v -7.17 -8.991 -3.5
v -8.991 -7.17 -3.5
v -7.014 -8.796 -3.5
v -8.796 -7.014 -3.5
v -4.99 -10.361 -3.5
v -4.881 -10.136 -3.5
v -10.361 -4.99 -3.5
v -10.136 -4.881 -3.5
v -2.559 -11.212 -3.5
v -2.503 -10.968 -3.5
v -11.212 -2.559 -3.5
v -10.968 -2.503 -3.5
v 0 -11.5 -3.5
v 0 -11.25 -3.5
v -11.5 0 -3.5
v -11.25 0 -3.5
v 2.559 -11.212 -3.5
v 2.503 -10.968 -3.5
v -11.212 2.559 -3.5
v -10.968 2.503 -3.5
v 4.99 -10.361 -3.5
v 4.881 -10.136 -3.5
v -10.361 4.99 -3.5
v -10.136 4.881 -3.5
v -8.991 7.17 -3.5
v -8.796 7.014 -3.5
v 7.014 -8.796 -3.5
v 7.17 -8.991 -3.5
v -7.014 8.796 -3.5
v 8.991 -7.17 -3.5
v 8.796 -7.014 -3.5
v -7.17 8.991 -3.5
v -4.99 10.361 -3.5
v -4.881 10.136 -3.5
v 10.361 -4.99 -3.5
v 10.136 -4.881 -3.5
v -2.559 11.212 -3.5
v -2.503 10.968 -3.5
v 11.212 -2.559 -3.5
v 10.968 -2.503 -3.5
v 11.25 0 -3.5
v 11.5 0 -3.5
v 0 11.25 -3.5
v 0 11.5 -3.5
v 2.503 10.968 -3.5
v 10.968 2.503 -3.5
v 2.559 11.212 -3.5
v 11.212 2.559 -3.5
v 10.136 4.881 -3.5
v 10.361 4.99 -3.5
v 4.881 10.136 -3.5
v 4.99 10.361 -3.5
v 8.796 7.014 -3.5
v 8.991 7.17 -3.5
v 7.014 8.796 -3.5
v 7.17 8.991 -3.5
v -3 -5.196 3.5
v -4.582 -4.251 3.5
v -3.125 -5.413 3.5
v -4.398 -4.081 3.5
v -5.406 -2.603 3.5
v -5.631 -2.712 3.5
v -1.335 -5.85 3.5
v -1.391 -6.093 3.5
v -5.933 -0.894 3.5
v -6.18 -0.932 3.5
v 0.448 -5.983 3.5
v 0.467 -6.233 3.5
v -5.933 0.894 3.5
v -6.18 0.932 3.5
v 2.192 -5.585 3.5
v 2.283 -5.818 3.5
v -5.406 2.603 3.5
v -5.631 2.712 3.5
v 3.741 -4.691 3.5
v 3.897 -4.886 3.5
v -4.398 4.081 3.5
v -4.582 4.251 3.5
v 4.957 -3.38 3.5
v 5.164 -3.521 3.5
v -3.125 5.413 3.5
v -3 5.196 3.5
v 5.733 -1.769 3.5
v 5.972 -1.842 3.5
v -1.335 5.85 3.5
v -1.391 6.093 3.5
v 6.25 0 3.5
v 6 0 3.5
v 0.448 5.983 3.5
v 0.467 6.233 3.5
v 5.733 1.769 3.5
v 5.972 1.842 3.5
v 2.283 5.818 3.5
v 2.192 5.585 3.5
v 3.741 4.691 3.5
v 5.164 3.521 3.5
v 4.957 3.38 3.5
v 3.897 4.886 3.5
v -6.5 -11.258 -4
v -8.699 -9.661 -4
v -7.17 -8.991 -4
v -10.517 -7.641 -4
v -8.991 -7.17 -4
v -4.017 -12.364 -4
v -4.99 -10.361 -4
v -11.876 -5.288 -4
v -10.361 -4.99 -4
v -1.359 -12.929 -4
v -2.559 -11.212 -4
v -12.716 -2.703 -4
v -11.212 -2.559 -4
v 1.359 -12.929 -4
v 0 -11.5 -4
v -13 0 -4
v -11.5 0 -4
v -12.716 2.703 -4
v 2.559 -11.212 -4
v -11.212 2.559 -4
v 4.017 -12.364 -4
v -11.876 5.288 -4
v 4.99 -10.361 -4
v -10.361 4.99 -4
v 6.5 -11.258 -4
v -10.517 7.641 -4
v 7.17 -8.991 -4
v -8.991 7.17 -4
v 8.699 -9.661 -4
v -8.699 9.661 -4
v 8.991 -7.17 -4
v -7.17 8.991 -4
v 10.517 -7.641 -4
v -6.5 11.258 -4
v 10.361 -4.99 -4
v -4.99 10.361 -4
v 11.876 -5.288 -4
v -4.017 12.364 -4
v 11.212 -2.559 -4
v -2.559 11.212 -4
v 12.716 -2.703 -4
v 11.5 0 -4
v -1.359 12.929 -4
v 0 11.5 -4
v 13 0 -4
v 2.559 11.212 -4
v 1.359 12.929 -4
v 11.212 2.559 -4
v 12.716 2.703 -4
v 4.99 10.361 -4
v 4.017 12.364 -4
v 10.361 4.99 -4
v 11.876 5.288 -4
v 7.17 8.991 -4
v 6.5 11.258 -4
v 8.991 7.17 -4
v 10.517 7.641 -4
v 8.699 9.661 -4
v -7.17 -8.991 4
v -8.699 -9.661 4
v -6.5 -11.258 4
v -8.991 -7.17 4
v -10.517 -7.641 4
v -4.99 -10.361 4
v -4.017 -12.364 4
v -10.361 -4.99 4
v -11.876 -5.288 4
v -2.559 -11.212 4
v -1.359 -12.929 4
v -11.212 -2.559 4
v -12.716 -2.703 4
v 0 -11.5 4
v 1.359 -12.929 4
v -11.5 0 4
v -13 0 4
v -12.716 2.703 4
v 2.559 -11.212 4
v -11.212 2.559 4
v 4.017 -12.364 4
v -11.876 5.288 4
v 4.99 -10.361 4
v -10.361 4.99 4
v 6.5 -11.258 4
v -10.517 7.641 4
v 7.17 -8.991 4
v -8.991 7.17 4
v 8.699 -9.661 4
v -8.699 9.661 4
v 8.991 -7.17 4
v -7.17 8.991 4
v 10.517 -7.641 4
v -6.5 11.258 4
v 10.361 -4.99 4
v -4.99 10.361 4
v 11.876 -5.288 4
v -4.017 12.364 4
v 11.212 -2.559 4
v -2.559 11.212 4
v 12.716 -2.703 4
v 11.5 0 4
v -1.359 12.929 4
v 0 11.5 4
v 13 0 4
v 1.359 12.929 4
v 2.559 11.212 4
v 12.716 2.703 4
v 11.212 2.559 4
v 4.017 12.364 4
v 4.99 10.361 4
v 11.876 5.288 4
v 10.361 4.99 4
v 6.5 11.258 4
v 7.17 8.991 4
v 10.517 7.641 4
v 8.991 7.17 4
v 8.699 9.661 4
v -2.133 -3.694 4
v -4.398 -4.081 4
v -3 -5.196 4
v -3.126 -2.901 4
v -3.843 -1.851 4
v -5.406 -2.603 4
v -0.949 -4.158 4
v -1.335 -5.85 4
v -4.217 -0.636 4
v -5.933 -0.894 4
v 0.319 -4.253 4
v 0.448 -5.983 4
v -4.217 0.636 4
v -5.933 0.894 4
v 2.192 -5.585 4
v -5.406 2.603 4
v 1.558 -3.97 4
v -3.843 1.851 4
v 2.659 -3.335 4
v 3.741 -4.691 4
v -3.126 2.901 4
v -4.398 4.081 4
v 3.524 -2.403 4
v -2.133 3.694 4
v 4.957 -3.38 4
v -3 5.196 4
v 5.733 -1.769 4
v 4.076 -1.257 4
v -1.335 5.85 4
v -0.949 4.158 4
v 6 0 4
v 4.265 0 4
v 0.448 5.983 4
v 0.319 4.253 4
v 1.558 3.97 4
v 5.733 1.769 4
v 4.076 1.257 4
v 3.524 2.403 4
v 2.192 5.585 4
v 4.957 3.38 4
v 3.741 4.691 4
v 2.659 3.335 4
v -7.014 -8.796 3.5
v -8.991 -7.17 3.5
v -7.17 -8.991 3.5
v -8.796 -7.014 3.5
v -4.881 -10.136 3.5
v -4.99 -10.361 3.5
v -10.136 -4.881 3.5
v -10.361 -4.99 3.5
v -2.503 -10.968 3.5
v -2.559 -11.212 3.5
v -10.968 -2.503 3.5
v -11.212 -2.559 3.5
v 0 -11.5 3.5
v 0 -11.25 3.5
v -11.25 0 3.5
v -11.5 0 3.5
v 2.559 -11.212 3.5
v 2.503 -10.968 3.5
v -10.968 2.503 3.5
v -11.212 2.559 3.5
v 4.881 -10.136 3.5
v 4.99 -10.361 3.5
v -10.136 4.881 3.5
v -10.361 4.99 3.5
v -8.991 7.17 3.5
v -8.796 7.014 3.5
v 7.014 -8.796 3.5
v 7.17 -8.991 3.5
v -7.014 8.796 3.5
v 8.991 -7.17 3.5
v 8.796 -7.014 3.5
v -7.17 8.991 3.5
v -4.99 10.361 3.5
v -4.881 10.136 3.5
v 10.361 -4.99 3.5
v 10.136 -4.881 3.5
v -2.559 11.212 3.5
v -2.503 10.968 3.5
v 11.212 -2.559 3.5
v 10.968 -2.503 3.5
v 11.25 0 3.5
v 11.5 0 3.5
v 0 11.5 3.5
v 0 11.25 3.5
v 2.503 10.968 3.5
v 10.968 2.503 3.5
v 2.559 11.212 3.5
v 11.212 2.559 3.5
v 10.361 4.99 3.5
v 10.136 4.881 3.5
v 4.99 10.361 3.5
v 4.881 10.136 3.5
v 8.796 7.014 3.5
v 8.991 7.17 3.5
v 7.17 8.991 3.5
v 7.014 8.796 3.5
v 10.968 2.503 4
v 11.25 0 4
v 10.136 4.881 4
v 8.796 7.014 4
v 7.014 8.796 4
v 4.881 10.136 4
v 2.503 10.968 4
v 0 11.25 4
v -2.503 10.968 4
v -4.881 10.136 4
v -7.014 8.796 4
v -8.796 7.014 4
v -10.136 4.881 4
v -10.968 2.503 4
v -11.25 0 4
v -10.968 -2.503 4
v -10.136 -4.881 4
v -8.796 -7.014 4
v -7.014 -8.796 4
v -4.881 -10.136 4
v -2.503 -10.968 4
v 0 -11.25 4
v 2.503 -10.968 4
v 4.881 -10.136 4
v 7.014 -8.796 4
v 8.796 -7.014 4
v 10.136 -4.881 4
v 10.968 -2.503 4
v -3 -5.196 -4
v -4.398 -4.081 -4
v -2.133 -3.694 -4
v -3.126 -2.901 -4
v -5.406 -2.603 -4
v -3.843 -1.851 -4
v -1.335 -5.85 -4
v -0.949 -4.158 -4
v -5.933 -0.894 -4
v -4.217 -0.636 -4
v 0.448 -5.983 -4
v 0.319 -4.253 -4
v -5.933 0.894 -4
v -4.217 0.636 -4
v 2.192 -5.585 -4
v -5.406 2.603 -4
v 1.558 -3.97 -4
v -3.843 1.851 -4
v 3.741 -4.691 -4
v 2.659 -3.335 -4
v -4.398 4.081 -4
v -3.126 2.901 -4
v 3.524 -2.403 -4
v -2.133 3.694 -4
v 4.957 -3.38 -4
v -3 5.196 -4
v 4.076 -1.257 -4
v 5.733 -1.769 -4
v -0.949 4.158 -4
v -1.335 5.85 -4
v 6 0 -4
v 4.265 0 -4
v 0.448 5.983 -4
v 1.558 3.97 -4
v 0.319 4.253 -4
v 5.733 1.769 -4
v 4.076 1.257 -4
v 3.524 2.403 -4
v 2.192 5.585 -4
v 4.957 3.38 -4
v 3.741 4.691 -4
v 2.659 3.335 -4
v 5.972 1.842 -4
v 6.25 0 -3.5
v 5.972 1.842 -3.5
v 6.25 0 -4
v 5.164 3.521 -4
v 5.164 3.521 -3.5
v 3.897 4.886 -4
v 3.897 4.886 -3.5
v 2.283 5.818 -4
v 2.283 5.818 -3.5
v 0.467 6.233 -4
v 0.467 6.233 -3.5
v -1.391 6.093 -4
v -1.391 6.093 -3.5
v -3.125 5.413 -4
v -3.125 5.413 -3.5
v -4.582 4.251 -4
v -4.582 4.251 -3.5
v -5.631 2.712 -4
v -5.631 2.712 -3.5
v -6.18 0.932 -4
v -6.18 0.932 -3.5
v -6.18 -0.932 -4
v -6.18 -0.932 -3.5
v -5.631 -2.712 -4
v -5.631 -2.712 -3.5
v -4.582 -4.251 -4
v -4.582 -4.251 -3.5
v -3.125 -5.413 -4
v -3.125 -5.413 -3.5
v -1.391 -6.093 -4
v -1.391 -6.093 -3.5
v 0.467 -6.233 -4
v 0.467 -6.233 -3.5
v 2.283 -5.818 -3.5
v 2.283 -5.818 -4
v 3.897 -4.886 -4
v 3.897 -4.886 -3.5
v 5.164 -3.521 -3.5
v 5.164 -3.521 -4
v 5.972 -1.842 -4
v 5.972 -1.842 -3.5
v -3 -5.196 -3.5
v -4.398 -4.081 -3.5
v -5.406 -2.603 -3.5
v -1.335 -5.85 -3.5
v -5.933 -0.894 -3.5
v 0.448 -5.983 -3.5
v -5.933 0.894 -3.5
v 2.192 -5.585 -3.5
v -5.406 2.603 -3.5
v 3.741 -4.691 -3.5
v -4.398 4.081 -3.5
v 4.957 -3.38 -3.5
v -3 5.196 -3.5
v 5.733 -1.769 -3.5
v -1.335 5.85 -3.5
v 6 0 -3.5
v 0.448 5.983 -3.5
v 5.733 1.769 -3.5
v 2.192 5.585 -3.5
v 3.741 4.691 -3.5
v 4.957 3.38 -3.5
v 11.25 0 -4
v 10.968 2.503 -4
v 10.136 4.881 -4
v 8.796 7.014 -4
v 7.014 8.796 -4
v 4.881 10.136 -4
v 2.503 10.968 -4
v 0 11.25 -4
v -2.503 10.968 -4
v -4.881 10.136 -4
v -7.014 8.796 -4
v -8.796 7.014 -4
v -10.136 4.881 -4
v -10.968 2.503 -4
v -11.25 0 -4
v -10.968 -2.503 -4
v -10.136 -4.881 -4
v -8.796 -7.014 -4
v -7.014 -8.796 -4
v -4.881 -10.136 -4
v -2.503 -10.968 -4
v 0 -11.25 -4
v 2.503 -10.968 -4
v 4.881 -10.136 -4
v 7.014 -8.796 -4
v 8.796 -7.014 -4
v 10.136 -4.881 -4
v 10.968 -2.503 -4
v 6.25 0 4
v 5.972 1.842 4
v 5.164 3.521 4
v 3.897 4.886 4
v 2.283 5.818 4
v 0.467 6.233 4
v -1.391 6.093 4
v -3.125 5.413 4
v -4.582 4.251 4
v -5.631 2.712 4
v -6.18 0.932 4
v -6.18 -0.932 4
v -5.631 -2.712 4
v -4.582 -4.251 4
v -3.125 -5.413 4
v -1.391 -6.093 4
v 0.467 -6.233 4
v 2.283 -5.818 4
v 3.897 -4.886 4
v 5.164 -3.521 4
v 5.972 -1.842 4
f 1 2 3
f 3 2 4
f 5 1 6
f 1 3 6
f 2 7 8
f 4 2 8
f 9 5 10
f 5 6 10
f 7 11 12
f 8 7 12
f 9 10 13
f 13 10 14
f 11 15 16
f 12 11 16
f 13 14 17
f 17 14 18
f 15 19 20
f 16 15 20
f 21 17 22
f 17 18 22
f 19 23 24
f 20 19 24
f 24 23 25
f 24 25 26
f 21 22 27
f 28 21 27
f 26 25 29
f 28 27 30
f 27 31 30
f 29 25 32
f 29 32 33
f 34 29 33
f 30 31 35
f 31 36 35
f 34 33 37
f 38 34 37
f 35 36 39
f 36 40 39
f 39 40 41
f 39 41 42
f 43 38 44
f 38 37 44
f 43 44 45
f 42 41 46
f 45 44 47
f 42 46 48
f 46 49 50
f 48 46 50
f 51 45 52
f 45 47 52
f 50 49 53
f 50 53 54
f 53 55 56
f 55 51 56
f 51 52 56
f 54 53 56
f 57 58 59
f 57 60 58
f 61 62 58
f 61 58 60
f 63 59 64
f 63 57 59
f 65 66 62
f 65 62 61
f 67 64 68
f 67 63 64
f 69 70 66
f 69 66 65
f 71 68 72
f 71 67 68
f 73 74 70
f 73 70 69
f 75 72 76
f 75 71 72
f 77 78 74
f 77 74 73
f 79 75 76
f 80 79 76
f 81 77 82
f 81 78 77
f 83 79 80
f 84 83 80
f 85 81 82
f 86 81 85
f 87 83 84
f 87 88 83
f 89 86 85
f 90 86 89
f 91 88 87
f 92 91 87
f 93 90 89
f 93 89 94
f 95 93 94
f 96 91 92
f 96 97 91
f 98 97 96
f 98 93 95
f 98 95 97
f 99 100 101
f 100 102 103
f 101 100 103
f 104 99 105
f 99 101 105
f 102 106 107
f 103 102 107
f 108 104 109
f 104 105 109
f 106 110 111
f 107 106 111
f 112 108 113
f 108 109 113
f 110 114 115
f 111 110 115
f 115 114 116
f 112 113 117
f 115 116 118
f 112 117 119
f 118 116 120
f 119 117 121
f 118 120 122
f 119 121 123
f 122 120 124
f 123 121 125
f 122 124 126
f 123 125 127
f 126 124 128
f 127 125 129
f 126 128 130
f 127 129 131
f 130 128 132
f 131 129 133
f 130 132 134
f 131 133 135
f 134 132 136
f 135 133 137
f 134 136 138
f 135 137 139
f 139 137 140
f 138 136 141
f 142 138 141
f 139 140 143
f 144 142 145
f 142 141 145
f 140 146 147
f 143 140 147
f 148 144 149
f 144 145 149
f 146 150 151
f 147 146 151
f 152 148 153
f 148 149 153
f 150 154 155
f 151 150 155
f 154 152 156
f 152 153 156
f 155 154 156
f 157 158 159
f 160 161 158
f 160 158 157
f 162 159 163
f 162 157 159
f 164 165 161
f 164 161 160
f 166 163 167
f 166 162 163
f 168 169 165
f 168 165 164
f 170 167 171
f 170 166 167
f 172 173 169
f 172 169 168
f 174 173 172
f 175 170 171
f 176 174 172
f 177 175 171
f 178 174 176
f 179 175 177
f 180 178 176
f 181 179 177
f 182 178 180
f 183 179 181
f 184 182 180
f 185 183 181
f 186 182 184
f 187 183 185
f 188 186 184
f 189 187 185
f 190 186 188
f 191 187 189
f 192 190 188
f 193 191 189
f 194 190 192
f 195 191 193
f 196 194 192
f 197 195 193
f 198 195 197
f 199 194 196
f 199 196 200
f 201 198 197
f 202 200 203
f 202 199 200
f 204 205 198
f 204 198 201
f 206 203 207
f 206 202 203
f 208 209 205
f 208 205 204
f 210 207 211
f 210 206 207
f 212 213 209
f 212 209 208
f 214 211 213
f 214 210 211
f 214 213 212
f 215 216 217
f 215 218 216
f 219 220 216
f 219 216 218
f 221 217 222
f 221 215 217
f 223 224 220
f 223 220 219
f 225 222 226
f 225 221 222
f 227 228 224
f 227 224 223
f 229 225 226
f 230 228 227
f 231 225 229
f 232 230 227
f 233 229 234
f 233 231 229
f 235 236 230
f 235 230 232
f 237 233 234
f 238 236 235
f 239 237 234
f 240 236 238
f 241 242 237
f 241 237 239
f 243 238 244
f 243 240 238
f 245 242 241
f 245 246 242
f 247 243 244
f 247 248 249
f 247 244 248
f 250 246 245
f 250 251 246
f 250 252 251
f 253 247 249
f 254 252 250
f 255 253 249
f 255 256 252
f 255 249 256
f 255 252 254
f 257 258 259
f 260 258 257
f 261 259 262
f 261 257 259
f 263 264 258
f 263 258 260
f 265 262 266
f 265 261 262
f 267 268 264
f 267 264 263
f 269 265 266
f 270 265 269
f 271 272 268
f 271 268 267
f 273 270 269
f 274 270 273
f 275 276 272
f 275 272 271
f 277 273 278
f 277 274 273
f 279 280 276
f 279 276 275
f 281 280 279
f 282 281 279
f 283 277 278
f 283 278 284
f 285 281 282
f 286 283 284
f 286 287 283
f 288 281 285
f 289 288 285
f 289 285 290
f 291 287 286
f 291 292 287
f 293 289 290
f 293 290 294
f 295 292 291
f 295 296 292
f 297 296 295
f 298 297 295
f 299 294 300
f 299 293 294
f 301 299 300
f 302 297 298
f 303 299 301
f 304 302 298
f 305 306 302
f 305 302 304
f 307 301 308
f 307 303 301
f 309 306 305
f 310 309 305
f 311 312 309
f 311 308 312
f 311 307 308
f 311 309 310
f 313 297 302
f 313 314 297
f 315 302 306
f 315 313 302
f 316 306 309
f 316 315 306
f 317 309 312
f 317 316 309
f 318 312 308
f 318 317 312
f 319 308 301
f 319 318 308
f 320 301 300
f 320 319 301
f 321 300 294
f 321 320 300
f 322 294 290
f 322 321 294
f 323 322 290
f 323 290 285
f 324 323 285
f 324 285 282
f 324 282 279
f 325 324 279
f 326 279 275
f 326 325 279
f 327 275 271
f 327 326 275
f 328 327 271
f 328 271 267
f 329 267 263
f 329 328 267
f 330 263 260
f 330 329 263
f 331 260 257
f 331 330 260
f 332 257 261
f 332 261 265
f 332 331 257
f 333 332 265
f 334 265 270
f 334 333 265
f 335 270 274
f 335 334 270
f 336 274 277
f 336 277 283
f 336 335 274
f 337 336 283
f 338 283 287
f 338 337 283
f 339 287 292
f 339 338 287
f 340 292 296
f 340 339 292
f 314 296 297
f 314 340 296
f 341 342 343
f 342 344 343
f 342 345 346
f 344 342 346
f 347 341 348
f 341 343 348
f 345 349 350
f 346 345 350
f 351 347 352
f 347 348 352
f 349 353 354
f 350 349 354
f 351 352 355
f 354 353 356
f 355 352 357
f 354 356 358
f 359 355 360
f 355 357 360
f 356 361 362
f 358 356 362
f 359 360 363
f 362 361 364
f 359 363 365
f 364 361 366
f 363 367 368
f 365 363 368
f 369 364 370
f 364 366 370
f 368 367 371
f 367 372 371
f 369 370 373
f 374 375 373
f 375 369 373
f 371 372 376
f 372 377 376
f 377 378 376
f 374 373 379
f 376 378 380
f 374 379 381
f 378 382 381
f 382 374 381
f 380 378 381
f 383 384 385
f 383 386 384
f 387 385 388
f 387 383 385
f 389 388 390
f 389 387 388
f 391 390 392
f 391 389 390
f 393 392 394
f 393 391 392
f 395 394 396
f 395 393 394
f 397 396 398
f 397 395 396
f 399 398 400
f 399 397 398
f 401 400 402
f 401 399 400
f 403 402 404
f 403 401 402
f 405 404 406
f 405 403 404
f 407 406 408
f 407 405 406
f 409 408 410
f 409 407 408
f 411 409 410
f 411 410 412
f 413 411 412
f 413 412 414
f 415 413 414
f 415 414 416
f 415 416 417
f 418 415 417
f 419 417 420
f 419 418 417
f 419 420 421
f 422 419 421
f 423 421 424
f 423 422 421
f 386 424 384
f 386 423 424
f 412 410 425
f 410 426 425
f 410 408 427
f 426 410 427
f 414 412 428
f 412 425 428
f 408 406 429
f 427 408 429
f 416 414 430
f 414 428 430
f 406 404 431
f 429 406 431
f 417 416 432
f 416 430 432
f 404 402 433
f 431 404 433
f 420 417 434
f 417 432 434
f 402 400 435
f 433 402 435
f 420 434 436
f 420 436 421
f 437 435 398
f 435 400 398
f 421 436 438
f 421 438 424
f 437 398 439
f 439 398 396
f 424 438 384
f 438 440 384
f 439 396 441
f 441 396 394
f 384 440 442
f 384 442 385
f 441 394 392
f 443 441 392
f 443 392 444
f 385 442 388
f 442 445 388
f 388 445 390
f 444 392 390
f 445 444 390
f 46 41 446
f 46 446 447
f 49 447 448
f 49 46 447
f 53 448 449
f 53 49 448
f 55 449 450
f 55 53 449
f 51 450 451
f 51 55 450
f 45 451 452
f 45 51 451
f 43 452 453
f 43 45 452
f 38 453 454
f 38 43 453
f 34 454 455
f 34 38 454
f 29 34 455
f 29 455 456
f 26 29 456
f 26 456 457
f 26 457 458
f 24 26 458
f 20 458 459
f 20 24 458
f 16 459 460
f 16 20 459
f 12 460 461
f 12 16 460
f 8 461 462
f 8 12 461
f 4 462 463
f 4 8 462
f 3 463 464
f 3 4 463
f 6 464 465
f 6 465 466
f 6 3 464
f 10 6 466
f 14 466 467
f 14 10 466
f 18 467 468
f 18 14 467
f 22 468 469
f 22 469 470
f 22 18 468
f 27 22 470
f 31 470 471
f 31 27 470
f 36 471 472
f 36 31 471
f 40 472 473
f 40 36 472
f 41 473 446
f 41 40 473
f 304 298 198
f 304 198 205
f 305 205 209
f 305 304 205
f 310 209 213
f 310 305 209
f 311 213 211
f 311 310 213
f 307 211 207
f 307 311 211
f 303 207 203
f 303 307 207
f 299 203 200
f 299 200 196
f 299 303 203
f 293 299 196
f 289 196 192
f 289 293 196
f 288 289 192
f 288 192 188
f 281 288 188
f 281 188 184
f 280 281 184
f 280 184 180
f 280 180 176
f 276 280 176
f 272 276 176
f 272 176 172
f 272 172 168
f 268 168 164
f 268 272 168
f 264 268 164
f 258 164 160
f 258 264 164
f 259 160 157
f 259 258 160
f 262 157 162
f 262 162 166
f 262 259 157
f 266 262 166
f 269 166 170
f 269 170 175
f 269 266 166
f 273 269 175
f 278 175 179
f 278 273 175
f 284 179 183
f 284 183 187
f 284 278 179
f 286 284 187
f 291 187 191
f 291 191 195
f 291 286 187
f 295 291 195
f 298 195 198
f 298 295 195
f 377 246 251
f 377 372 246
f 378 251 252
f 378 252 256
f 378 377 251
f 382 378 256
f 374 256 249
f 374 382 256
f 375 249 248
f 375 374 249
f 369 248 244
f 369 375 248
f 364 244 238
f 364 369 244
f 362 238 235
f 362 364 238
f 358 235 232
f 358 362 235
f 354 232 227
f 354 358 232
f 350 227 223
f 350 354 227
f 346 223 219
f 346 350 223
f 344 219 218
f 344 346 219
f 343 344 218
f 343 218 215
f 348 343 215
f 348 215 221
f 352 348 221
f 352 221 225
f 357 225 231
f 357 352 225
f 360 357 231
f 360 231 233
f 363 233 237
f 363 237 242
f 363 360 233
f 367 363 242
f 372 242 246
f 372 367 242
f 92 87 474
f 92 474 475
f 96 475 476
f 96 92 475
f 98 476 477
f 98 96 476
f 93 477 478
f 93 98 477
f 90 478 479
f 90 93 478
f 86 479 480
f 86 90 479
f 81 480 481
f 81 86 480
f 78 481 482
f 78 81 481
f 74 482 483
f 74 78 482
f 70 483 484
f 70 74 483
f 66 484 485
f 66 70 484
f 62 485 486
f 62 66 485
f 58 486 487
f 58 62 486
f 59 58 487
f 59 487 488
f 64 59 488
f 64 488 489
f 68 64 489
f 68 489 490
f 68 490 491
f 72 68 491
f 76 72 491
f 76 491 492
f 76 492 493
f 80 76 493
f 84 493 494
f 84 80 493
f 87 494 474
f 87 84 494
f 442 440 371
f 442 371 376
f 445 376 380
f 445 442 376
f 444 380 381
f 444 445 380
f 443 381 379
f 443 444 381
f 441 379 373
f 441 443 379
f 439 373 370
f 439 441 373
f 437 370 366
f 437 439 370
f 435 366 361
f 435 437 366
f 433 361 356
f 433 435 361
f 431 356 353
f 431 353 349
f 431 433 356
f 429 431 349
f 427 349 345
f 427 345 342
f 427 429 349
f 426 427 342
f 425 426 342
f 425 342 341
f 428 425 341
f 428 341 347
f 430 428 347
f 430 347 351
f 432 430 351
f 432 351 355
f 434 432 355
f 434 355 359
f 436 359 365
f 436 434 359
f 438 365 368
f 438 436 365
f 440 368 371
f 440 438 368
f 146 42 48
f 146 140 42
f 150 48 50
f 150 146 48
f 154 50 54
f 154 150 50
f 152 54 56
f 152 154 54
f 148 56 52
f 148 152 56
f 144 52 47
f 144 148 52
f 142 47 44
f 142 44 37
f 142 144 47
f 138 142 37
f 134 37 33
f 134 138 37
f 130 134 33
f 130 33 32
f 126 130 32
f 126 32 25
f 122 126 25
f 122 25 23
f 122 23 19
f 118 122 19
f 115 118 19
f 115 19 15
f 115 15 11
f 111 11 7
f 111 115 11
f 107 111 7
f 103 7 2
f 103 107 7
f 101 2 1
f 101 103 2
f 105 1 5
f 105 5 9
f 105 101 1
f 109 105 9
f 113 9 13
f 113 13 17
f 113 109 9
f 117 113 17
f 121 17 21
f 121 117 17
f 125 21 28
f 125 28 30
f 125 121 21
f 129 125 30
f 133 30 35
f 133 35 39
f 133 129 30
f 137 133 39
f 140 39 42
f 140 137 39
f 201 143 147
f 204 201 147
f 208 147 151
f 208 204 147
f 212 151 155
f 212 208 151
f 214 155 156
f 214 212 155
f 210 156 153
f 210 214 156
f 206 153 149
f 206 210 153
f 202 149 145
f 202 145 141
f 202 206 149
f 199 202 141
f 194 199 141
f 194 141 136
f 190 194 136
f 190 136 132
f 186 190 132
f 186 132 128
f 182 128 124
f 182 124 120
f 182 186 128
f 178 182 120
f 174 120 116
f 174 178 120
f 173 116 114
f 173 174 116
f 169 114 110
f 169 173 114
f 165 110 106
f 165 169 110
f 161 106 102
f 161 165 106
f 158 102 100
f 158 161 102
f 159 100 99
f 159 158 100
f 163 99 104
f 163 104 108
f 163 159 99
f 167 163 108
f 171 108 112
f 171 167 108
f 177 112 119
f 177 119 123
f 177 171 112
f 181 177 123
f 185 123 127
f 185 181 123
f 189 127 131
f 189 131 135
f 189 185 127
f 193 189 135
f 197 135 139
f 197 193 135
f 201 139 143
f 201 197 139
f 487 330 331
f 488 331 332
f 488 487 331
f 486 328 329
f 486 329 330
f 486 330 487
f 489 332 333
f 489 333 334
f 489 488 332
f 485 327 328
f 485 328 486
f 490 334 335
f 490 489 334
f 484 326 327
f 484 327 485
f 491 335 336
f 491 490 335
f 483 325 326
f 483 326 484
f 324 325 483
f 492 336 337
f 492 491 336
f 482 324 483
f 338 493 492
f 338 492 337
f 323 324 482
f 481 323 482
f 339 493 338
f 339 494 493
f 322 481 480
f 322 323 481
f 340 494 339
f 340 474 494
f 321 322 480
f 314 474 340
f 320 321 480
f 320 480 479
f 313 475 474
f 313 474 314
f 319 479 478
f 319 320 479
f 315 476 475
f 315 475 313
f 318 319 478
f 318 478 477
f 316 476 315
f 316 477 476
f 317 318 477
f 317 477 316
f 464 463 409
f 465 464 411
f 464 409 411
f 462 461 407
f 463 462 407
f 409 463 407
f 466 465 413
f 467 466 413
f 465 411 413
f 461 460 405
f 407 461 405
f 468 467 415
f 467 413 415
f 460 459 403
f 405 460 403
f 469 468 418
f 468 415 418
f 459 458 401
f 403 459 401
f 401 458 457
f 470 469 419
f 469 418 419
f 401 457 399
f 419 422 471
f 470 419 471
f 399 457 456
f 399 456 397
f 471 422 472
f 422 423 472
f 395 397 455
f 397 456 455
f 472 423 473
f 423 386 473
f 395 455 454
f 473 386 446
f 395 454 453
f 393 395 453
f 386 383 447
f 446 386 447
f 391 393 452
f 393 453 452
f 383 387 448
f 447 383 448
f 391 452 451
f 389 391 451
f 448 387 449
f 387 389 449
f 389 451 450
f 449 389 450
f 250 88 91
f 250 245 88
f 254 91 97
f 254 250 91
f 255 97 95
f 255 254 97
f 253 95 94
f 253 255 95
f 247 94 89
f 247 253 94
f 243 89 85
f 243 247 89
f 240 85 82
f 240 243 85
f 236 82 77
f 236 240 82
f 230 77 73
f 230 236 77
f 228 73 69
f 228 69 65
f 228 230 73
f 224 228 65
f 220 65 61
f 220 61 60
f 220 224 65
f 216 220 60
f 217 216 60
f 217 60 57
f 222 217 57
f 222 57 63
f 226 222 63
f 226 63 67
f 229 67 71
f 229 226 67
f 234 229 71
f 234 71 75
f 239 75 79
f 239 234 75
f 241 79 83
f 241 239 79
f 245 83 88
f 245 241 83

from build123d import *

# Parameters (mm, degrees)
F0_R     = 13
F0_R_2   = 11.5
F1_DEPTH = 4
F0_R_3   = 6
F0_R_4   = 4.265
F0_R_5   = 11.25
F0_R_6   = 6.25
F2_DEPTH = 3.5


with BuildPart() as f1:
    # F0 (on Top) → F1 (new body, symmetric)
    with BuildSketch(Plane.XY):
        Circle(F0_R)
        Circle(F0_R_2, mode=Mode.SUBTRACT)
    extrude(amount=F1_DEPTH, both=True)



with BuildPart() as f1b:
    # F0 (on Top) → F1, piece 2 (new body, symmetric)
    with BuildSketch(Plane.XY):
        Circle(F0_R_3)
        Circle(F0_R_4, mode=Mode.SUBTRACT)
    extrude(amount=F1_DEPTH, both=True)


with BuildPart() as f1c:
    # F0 (on Top) → F1, piece 3 (new body, symmetric)
    with BuildSketch(Plane.XY):
        Circle(F0_R_5)
        Circle(F0_R_6, mode=Mode.SUBTRACT)
    extrude(amount=F1_DEPTH, both=True)


with BuildPart() as f1_1:
    add(f1.part)

    add(f1b.part)  # F2 merges F1b

    add(f1c.part)  # F2 merges F1c
    # F0 (on Top) → F2 (join, symmetric)
    with BuildSketch(Plane.XY):
        Circle(F0_R_2)
        Circle(F0_R_5, mode=Mode.SUBTRACT)
        Circle(F0_R_6)
        Circle(F0_R_3, mode=Mode.SUBTRACT)
    extrude(amount=F2_DEPTH, both=True)


solid = f1_1.part
